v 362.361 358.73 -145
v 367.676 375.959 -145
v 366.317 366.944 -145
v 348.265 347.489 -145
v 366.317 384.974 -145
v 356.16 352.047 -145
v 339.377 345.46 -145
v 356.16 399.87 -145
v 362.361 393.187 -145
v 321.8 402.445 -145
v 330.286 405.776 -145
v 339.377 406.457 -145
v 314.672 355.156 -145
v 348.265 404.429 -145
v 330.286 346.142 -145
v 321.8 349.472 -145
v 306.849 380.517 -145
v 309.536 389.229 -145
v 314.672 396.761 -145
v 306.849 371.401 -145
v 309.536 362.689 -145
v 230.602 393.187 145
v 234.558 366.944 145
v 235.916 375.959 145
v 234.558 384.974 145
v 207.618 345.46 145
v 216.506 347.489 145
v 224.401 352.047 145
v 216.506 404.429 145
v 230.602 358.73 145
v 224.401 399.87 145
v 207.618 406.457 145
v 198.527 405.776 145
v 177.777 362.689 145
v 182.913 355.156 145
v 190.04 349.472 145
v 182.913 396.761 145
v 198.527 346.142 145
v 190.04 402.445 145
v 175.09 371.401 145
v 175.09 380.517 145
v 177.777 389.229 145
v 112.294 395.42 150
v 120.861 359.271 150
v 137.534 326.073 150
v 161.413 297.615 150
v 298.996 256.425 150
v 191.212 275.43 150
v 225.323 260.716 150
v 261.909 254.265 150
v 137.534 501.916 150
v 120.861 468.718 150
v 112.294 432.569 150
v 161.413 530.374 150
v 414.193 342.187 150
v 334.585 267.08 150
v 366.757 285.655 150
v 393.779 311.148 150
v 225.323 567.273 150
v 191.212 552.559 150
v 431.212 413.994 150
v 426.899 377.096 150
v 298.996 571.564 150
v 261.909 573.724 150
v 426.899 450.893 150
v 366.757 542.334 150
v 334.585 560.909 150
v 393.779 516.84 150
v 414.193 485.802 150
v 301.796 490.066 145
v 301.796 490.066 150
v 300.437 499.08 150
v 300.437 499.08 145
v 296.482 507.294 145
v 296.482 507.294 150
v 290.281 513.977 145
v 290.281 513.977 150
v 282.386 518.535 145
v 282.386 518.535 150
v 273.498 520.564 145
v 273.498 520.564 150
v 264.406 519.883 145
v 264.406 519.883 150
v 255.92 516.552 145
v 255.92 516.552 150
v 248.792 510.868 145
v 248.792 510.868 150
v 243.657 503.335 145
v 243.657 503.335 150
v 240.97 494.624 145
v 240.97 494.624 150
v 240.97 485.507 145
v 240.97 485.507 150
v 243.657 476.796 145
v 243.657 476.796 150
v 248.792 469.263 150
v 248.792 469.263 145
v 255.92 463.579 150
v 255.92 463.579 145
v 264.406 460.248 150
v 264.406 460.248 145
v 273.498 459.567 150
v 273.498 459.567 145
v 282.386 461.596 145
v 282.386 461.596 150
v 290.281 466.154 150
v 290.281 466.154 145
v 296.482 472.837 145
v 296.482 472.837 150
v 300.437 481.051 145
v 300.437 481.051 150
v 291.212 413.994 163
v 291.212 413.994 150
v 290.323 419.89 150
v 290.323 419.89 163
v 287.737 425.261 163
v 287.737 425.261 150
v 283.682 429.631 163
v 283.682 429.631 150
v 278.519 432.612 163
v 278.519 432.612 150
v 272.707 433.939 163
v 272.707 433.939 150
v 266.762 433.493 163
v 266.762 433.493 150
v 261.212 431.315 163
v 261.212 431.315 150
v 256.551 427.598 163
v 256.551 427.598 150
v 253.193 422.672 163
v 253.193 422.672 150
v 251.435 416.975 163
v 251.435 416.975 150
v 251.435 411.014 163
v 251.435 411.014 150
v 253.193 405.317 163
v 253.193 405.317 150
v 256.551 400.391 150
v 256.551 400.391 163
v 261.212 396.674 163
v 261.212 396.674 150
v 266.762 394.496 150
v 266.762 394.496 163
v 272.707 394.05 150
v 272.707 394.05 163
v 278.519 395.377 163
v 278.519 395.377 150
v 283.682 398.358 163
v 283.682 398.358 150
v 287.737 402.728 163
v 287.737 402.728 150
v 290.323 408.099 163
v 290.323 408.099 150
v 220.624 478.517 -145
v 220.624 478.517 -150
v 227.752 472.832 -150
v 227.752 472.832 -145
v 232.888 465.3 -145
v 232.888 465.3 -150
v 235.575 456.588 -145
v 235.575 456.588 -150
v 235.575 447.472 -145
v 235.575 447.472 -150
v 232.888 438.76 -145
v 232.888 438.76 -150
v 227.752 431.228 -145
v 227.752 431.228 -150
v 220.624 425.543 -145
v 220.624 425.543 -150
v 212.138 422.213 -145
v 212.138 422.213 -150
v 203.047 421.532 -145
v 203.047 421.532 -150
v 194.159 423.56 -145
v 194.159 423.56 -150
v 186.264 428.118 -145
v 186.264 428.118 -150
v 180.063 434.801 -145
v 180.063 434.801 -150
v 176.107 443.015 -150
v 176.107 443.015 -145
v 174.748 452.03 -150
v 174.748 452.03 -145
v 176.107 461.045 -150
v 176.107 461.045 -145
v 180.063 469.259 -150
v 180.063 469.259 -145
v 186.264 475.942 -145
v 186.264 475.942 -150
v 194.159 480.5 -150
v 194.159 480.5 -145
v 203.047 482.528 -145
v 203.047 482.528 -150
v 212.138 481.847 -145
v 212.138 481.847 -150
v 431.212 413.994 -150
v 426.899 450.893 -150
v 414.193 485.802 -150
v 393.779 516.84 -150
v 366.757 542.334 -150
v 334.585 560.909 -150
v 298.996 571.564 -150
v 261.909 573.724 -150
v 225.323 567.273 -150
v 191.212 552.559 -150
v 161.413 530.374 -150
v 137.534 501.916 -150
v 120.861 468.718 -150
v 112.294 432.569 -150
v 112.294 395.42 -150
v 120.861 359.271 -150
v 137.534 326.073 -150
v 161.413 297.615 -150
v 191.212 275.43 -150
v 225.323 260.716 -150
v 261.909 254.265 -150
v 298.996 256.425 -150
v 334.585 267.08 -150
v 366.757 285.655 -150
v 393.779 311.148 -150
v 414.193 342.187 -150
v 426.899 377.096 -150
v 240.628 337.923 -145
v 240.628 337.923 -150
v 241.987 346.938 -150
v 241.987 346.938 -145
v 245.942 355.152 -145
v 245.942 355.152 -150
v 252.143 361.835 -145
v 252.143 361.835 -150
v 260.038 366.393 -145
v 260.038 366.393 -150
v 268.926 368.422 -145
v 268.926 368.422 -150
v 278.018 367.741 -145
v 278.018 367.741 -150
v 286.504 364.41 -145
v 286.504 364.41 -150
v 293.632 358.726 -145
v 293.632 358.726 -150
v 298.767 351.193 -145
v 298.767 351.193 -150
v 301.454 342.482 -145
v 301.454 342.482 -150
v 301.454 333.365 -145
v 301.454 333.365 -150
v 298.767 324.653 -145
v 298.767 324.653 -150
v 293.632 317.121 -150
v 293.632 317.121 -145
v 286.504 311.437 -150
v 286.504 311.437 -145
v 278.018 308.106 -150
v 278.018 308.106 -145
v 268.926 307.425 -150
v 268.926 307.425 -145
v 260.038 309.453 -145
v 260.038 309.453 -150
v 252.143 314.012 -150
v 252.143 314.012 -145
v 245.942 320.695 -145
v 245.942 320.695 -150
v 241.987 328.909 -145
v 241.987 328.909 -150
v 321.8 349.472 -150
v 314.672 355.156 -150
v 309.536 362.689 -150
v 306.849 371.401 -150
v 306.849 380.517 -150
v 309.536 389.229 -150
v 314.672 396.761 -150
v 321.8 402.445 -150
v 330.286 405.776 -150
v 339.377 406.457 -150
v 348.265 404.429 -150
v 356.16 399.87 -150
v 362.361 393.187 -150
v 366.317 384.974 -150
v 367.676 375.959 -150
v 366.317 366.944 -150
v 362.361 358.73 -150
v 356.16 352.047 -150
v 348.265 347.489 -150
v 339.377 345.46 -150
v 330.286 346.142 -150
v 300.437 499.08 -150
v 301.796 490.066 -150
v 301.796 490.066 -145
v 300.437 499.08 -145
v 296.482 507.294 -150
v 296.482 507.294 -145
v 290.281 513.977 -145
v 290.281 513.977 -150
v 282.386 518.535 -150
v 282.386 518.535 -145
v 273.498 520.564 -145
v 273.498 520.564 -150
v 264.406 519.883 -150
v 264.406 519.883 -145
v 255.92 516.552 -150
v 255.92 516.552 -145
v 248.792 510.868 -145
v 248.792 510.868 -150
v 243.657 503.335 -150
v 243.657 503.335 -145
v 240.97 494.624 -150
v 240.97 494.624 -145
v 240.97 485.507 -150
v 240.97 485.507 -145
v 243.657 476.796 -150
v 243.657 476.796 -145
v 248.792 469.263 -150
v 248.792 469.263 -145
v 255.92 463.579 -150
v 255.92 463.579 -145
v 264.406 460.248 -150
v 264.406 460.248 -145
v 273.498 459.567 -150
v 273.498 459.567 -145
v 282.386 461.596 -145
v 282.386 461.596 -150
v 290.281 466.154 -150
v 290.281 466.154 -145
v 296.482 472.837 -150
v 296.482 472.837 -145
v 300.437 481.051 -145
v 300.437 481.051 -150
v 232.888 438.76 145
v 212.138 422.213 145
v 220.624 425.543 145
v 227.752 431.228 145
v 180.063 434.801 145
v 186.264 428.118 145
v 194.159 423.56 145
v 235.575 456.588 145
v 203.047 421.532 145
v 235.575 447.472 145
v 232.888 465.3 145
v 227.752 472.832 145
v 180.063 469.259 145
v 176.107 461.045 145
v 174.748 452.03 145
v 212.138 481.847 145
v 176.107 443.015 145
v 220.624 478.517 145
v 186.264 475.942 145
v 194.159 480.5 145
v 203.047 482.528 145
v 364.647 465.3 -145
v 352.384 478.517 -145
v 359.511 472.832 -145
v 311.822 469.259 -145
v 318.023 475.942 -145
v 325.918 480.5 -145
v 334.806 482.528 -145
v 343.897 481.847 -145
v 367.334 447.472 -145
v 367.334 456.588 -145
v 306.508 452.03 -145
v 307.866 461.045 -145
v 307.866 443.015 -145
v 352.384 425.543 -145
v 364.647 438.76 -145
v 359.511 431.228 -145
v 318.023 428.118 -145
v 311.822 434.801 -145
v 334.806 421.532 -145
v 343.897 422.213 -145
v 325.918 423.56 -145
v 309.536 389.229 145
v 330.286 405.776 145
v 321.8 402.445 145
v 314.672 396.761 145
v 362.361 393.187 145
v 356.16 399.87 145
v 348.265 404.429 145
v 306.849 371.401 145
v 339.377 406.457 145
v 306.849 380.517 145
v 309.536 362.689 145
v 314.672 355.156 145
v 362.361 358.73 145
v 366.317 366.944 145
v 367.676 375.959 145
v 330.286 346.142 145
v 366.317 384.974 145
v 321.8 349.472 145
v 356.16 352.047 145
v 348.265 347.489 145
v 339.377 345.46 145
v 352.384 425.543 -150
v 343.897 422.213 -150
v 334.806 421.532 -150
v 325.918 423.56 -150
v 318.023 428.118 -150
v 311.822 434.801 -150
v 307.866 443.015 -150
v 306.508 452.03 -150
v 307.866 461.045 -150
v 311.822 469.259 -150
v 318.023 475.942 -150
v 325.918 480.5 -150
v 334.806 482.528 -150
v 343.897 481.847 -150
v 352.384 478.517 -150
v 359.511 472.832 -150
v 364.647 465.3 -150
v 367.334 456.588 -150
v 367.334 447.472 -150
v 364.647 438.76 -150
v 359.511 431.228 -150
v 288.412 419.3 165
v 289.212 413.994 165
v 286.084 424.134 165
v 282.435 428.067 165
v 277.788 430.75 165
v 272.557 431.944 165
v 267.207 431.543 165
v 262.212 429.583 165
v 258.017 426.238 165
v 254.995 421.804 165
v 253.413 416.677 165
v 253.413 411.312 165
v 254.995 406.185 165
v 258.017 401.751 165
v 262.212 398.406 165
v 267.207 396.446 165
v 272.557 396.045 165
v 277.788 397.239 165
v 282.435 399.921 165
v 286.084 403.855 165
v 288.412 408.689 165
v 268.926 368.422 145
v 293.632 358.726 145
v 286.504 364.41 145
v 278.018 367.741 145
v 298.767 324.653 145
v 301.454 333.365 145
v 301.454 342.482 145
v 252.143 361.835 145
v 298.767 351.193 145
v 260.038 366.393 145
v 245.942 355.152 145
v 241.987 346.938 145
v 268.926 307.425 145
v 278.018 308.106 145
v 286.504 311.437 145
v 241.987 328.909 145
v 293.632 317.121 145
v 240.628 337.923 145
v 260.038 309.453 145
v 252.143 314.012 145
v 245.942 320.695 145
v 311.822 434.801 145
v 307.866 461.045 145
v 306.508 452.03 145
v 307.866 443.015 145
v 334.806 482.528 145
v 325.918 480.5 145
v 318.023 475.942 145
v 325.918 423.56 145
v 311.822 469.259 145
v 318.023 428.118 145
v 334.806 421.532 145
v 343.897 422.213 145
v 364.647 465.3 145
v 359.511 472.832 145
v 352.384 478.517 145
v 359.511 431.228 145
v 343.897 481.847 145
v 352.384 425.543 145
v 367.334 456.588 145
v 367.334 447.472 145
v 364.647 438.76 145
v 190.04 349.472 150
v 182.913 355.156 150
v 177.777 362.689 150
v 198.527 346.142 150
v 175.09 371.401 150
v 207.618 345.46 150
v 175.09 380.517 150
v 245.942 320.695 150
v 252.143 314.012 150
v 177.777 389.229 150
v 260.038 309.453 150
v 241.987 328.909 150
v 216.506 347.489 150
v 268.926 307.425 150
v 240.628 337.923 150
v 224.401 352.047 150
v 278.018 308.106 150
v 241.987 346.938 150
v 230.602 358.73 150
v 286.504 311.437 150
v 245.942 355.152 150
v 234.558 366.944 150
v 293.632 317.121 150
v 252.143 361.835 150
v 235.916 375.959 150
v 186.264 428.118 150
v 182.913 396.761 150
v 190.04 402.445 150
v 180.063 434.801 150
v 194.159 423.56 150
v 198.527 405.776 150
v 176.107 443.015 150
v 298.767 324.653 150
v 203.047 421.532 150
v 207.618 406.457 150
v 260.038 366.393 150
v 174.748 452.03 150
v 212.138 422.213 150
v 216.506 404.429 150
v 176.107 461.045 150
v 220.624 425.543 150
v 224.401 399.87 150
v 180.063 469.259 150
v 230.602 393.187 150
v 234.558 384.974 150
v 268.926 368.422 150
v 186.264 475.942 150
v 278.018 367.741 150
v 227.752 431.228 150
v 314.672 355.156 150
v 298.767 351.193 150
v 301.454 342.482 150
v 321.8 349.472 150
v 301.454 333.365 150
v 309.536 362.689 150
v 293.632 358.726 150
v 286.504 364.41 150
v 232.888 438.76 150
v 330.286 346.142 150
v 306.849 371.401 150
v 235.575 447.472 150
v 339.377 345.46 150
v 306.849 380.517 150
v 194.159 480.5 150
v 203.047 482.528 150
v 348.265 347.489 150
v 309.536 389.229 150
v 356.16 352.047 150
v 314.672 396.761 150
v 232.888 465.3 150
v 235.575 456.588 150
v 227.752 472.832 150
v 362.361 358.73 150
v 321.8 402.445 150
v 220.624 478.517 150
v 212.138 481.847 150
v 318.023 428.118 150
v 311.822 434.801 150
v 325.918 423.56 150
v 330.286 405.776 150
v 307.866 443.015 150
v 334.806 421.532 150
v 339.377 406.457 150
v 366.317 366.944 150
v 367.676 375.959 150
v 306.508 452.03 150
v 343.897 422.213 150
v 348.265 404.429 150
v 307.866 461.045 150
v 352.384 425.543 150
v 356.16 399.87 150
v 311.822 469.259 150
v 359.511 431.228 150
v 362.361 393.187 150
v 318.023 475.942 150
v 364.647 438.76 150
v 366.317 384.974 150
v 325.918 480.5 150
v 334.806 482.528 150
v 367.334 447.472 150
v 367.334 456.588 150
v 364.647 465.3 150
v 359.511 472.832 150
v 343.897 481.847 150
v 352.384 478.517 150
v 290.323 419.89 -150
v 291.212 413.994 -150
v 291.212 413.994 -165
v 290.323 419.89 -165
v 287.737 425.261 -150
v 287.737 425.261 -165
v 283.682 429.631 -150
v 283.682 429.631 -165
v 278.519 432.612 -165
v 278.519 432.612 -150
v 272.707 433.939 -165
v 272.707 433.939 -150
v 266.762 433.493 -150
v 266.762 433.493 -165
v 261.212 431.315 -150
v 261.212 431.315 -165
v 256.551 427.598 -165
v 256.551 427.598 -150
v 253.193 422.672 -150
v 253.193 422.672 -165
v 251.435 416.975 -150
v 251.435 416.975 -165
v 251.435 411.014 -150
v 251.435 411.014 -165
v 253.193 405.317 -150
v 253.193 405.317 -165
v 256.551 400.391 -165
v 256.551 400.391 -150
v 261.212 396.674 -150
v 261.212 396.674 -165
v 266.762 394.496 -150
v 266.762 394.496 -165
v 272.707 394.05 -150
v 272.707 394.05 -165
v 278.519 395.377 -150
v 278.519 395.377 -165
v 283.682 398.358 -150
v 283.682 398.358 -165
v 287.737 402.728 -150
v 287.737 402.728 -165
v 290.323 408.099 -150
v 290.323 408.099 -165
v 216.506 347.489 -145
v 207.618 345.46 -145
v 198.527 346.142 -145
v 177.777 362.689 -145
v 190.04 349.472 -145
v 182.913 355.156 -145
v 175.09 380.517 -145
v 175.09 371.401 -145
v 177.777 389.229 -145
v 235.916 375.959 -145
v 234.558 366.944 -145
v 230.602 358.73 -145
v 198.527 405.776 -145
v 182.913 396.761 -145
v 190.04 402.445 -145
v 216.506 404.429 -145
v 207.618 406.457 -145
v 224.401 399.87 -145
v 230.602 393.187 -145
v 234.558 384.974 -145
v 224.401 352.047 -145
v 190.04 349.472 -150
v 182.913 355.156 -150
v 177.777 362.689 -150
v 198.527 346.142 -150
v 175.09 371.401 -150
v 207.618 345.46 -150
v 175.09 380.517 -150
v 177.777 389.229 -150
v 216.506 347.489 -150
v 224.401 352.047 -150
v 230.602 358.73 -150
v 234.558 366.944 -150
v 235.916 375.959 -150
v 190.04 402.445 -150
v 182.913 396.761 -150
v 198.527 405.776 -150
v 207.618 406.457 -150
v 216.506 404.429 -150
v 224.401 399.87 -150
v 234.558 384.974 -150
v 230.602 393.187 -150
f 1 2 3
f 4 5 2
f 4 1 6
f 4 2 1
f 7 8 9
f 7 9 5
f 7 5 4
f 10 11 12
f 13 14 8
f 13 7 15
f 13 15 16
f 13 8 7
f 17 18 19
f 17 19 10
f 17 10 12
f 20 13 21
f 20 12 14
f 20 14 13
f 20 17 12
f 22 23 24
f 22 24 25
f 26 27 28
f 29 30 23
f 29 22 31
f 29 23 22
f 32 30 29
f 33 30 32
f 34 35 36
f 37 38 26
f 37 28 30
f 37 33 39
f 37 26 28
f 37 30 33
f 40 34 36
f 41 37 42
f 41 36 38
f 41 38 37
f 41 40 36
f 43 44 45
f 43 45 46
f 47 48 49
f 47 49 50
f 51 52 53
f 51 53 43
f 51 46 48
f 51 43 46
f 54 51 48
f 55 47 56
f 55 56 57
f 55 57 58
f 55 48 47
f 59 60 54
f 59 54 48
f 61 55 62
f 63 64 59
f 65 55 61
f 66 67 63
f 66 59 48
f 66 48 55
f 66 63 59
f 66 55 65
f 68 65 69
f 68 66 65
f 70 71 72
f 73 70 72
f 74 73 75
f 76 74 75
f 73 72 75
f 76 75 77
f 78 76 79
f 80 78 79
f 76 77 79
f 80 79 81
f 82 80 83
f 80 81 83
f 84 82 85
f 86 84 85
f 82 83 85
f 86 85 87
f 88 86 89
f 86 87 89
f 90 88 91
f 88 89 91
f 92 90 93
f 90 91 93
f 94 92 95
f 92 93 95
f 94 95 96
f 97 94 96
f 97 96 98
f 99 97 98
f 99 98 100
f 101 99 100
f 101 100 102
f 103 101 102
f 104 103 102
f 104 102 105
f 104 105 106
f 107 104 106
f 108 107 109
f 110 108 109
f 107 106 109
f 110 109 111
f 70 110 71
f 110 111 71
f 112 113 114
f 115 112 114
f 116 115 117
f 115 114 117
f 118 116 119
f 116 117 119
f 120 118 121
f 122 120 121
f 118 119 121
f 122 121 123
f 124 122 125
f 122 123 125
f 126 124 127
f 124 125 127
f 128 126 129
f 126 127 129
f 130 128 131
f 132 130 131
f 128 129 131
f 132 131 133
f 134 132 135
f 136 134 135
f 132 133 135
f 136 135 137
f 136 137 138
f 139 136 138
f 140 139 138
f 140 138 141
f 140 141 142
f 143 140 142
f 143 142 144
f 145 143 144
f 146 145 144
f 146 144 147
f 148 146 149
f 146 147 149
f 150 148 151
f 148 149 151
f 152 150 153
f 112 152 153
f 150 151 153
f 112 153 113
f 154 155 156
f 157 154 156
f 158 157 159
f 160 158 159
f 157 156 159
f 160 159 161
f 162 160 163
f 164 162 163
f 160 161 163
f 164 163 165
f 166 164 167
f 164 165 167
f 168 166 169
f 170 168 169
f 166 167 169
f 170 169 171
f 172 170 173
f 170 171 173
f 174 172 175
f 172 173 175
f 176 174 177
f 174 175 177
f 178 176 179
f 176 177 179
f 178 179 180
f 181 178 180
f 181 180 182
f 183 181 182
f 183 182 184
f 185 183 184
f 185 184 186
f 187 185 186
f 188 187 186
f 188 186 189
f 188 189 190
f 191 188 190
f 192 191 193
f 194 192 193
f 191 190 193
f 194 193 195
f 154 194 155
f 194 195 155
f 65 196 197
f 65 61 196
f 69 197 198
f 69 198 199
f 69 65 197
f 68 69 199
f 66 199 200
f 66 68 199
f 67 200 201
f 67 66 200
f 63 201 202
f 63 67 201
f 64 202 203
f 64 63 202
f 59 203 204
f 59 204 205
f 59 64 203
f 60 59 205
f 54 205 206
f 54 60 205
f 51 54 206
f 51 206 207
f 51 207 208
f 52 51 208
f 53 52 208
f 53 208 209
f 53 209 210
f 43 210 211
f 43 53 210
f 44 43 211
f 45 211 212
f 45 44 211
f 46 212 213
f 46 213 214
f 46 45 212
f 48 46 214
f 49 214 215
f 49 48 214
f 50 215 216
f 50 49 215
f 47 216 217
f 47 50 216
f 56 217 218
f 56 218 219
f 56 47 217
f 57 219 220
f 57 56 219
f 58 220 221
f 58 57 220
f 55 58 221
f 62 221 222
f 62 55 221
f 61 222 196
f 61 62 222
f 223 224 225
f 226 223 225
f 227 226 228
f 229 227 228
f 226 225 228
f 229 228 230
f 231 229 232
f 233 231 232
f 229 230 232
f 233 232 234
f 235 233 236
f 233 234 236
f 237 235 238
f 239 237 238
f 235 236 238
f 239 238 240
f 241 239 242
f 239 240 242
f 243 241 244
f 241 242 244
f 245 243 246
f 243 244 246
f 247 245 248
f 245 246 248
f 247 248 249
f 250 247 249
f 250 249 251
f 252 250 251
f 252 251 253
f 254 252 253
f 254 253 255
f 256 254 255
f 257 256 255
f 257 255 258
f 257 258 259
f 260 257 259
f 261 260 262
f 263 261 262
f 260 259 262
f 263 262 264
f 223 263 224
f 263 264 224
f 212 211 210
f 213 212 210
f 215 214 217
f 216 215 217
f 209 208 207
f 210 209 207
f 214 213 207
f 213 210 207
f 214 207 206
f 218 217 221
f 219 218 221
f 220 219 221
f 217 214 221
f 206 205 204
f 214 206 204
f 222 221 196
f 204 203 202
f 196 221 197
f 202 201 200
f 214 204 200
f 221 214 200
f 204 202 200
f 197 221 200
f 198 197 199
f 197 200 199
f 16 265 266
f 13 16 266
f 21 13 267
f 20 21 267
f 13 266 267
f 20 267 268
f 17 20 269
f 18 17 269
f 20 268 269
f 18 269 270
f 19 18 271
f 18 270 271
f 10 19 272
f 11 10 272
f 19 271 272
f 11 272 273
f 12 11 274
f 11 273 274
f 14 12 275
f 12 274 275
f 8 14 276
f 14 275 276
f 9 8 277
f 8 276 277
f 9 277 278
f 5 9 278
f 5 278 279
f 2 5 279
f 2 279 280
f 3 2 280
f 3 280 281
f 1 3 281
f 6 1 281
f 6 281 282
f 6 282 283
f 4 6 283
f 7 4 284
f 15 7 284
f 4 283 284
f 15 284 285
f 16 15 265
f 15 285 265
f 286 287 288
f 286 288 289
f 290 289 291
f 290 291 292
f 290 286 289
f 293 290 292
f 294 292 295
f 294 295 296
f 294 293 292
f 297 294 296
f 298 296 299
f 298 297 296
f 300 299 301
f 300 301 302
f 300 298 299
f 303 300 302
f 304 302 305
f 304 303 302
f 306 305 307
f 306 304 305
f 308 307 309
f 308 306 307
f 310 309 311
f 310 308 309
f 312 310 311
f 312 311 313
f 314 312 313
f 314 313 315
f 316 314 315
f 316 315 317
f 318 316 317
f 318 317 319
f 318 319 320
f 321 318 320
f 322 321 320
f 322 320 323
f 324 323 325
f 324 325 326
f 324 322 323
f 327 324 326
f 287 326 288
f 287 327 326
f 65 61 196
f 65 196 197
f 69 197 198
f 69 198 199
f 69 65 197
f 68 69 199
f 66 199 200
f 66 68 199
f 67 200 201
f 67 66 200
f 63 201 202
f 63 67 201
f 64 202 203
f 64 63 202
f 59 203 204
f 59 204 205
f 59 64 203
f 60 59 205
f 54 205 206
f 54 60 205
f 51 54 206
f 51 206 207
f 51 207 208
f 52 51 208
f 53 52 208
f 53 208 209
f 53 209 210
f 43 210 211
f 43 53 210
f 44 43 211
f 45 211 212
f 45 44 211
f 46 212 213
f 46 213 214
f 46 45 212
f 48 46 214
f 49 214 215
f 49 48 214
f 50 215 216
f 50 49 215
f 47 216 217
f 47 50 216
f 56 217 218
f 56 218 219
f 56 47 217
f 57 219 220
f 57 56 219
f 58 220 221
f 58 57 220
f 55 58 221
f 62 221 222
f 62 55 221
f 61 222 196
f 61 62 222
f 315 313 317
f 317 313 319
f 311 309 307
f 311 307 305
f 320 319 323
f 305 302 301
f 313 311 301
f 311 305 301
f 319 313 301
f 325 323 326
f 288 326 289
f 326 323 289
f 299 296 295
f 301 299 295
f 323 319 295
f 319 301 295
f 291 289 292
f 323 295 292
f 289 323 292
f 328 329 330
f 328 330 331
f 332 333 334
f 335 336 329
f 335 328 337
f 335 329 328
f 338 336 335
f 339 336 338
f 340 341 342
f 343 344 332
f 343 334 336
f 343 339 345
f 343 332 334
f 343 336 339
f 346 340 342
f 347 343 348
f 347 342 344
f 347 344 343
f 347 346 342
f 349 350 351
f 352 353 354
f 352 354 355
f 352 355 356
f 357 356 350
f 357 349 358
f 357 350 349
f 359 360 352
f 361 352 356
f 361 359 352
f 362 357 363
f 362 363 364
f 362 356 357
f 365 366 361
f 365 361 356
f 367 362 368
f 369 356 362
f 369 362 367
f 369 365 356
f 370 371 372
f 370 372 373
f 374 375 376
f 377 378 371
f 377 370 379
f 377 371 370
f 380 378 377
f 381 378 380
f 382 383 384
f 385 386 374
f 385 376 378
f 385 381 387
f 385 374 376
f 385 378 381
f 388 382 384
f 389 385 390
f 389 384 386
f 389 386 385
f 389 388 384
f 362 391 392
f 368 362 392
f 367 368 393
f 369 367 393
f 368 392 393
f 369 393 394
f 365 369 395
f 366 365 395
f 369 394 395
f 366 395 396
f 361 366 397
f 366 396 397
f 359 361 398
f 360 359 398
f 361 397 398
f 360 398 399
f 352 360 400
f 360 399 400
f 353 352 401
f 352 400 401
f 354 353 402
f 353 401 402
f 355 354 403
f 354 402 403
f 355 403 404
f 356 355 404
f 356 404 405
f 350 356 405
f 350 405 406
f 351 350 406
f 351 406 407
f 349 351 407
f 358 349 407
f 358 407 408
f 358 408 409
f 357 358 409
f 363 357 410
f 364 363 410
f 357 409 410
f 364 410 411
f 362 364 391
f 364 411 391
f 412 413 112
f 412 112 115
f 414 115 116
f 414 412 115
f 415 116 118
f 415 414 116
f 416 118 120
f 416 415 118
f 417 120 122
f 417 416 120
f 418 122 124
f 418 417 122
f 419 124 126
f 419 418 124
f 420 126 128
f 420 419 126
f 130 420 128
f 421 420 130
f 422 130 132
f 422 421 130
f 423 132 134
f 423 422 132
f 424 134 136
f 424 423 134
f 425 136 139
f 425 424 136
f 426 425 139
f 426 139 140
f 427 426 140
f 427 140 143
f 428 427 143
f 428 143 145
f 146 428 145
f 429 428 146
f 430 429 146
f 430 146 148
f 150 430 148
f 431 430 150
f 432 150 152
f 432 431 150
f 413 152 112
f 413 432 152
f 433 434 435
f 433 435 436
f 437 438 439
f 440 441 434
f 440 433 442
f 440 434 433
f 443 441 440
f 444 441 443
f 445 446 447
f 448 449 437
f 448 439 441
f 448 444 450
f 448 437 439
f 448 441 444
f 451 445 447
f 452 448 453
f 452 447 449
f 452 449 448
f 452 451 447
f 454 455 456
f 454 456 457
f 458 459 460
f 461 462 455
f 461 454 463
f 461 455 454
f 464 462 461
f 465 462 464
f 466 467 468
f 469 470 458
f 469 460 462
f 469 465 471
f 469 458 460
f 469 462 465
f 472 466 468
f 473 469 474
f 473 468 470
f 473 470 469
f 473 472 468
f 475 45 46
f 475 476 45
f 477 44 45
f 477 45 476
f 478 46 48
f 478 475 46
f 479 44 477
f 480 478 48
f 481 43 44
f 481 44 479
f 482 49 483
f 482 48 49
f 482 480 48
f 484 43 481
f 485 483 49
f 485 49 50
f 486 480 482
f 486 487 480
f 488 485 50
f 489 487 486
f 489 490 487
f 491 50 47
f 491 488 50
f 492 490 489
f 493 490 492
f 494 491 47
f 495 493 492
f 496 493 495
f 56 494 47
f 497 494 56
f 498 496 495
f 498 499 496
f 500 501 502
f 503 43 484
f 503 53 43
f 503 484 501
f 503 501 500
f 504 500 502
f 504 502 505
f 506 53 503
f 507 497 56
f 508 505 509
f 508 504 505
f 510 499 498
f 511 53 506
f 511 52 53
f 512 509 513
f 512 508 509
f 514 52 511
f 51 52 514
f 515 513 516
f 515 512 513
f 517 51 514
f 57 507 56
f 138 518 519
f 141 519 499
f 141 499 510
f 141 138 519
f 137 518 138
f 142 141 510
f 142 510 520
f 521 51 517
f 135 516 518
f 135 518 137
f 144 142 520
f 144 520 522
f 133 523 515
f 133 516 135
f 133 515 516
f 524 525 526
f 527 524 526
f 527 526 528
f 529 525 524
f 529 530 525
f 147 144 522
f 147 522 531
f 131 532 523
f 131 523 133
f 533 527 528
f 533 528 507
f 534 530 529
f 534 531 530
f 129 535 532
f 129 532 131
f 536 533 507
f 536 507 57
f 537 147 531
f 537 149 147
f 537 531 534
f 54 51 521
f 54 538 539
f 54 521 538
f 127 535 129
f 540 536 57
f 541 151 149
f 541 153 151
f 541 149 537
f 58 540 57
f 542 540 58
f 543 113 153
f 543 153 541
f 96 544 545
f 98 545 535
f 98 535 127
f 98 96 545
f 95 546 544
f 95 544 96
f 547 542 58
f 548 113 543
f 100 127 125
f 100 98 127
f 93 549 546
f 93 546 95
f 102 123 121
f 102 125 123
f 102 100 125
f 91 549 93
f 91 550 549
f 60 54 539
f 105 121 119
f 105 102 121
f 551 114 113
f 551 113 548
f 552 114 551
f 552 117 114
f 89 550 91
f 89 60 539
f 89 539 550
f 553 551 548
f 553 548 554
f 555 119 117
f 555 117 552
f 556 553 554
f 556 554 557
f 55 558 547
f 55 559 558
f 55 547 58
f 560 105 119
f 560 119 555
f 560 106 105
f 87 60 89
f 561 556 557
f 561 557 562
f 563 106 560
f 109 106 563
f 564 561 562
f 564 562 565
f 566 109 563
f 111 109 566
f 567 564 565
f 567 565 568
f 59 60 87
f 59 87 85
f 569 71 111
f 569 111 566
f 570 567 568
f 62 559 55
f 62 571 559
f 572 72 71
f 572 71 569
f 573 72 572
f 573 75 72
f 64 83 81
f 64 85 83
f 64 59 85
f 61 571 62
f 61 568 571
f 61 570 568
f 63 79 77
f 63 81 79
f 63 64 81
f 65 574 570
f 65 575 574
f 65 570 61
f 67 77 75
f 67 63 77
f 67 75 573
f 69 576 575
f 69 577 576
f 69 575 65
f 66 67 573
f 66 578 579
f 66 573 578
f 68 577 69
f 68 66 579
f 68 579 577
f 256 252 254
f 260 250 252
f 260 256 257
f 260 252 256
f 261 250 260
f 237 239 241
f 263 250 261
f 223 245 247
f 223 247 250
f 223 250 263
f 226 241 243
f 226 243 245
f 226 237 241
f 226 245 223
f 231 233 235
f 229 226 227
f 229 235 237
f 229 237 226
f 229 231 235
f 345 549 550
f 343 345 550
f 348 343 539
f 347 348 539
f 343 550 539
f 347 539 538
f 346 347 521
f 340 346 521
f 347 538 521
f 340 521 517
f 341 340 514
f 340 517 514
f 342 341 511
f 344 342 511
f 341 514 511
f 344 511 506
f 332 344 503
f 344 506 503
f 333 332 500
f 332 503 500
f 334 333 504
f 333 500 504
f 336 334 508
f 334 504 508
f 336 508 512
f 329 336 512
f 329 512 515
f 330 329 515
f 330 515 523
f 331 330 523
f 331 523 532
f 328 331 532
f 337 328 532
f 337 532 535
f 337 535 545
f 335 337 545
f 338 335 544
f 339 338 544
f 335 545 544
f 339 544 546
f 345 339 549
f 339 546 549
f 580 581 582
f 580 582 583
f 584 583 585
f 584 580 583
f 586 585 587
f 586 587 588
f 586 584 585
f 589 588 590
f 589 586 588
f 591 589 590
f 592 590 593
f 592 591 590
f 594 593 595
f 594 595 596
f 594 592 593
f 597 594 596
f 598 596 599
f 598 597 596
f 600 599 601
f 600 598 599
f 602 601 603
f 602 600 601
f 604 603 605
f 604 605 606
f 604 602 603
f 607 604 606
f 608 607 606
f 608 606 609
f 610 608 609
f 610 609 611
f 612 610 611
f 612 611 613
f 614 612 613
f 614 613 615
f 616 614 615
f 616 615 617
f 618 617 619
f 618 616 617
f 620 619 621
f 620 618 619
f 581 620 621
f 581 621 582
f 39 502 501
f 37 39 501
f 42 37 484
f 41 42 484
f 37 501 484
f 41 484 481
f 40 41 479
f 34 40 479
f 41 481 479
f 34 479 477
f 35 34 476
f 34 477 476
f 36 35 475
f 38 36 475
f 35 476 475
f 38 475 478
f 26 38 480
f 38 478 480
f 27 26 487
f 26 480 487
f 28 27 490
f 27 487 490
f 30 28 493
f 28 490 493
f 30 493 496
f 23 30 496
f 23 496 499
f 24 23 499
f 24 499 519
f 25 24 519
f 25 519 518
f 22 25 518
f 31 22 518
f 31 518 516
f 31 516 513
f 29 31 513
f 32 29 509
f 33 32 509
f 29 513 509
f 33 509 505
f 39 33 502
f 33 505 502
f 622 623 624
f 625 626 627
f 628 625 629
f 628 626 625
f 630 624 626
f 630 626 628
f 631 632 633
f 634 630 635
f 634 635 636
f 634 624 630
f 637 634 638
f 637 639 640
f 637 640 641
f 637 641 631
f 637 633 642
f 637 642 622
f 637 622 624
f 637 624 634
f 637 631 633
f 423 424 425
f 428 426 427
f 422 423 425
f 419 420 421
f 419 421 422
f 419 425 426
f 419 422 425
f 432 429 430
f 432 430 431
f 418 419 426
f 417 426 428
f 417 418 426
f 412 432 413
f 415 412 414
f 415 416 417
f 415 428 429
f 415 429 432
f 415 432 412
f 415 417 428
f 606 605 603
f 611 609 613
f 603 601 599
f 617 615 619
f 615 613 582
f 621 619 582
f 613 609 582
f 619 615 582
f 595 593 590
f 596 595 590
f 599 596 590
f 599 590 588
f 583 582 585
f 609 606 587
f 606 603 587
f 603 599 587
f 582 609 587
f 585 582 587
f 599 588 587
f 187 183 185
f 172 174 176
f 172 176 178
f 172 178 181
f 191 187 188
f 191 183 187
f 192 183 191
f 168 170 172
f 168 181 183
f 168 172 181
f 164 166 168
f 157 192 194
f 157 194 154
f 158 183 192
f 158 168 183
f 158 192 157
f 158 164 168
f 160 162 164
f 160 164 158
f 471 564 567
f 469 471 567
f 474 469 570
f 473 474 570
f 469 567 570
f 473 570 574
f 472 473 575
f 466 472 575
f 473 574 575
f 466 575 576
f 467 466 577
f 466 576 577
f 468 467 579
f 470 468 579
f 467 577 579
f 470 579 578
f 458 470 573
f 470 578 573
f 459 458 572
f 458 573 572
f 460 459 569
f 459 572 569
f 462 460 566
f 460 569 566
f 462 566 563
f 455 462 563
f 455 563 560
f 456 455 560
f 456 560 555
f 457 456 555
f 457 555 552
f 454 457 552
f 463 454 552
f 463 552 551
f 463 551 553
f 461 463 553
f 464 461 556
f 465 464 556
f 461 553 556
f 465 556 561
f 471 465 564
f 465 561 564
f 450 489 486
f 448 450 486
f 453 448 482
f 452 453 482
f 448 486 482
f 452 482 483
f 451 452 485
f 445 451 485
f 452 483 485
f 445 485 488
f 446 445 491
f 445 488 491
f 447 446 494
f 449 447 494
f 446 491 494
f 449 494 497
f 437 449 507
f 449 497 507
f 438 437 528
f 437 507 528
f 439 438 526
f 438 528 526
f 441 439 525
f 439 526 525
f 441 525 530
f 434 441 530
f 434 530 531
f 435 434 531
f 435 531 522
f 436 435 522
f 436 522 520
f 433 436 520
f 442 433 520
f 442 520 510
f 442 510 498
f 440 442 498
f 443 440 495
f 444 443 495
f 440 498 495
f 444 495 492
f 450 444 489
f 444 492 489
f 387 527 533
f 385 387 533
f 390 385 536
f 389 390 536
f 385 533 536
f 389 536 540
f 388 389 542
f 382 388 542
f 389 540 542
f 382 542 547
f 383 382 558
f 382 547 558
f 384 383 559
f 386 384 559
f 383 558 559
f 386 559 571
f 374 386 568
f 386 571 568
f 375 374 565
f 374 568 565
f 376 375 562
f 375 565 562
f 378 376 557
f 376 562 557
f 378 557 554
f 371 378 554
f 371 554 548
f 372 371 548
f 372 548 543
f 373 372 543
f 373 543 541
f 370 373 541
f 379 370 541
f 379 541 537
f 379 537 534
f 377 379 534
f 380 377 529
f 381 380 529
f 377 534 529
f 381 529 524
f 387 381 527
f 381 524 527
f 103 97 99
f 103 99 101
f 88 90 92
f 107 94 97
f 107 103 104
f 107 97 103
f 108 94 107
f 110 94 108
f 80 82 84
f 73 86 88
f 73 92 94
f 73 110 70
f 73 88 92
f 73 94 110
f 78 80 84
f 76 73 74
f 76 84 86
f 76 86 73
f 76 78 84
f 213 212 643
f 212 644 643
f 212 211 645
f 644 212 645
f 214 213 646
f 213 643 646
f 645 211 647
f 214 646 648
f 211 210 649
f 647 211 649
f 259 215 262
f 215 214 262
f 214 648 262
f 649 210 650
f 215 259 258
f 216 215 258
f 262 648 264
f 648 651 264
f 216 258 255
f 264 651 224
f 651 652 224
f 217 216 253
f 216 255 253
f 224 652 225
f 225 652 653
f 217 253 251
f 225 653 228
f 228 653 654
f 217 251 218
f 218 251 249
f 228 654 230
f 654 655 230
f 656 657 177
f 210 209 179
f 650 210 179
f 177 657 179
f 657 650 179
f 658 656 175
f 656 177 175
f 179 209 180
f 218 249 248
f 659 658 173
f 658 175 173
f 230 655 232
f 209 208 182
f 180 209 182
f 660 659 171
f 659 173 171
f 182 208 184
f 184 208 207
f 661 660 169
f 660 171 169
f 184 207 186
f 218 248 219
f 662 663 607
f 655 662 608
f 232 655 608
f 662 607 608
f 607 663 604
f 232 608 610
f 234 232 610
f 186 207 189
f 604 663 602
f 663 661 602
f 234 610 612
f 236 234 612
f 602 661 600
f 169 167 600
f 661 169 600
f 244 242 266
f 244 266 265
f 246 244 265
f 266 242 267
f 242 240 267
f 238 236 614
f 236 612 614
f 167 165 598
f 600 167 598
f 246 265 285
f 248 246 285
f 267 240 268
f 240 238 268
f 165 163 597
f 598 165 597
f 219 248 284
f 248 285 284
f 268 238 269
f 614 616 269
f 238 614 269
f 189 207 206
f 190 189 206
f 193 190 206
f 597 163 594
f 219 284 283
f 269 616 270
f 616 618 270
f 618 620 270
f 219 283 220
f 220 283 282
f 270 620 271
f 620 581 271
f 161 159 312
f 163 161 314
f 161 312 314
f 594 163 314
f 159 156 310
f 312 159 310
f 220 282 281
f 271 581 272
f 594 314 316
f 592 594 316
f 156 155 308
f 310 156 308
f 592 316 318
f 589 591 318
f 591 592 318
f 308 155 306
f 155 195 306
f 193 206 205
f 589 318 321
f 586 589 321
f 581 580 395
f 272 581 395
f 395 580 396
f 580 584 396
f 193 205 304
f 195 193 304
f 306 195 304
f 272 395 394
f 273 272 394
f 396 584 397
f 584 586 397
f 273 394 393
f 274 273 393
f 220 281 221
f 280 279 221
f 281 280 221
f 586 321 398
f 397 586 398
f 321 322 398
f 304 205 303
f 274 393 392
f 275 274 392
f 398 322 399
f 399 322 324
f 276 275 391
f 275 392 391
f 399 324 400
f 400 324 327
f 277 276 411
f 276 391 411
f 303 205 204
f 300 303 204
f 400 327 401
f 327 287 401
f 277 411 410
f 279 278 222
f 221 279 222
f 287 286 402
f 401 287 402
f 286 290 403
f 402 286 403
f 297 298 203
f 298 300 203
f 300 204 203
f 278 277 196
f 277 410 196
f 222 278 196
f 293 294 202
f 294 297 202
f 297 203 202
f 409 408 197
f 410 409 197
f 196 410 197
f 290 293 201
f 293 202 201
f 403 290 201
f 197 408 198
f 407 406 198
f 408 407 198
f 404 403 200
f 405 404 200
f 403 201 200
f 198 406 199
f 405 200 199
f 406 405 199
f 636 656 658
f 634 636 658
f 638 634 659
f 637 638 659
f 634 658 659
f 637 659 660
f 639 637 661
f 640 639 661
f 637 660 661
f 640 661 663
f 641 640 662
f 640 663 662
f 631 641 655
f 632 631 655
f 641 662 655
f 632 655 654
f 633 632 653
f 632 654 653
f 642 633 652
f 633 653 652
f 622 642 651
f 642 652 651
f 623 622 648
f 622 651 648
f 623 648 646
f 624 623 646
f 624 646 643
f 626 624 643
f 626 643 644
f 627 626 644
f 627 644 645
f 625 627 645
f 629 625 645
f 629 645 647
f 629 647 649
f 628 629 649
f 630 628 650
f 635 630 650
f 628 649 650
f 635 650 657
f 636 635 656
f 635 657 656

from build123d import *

# Parameters (mm, degrees)
SKETCH1_R               = 160
BOSS_EXTRUDE1_DEPTH     = 150
SKETCH2_R               = 30.583998029
CUT_EXTRUDE1_DEPTH      = 5
CIRPATTERN1_COUNT       = 6
MIRROR1_COPY_1_SKETCH_R = 30.583998029
MIRROR1_COPY_1_DEPTH    = 5
MIRROR1_COPY_2_SKETCH_R = 30.583998029
MIRROR1_COPY_2_DEPTH    = 5
MIRROR1_COPY_3_SKETCH_R = 30.583998029
MIRROR1_COPY_3_DEPTH    = 5
MIRROR1_COPY_4_SKETCH_R = 30.583998029
MIRROR1_COPY_4_DEPTH    = 5
MIRROR1_COPY_5_SKETCH_R = 30.583998029
MIRROR1_COPY_5_DEPTH    = 5
SKETCH3_R               = 20
BOSS_EXTRUDE2_DEPTH     = 15
CHAMFER1_SIZE           = 2
SKETCH4_R               = 160
BOSS_EXTRUDE3_DEPTH     = 300


with BuildPart() as part:
    # Sketch1 → Boss-Extrude1 (new, symmetric)
    with BuildSketch(Plane.XY):
        with Locations((271.211975439, 413.994449049)):
            Circle(SKETCH1_R)
    extrude(amount=BOSS_EXTRUDE1_DEPTH, both=True)

    # Sketch2 → Cut-Extrude1 (cut)
    with BuildSketch(Plane.XY.offset(150)):
        with Locations((271.211975439, 490.065575896)):
            Circle(SKETCH2_R)
    cut_extrude1 = extrude(amount=-CUT_EXTRUDE1_DEPTH, mode=Mode.SUBTRACT)

    # CirPattern1: Cut-Extrude1 ×6 about axis
    cirpattern1_axis = Axis((271.211975439, 413.994449049, 0), (0, 0, 1))
    for i in range(1, CIRPATTERN1_COUNT):
        add(cut_extrude1.rotate(cirpattern1_axis, i * 360 / CIRPATTERN1_COUNT), mode=Mode.SUBTRACT)

    # Mirror1: Cut-Extrude1 across plane
    add(cut_extrude1.mirror(Plane.XY), mode=Mode.SUBTRACT)

    # Mirror1 copy 1 sketch → Mirror1 copy 1 (cut)
    with BuildSketch(Plane(origin=(494.135697622, -27.879236016, -150), x_dir=(0.5000000000000001, 0.8660254037844386, 0), z_dir=(0, 0, -1))):
        with Locations((271.211975439, -490.065575896)):
            Circle(MIRROR1_COPY_1_SKETCH_R)
    extrude(amount=-MIRROR1_COPY_1_DEPTH, mode=Mode.SUBTRACT)

    # Mirror1 copy 2 sketch → Mirror1 copy 2 (cut)
    with BuildSketch(Plane(origin=(765.347673061, 386.115213033, -150), x_dir=(-0.4999999999999998, 0.8660254037844387, 0), z_dir=(0, 0, -1))):
        with Locations((271.211975439, -490.065575896)):
            Circle(MIRROR1_COPY_2_SKETCH_R)
    extrude(amount=-MIRROR1_COPY_2_DEPTH, mode=Mode.SUBTRACT)

    # Mirror1 copy 3 sketch → Mirror1 copy 3 (cut)
    with BuildSketch(Plane(origin=(542.423950878, 827.988898099, -150), x_dir=(-1, 0, 0), z_dir=(0, 0, -1))):
        with Locations((271.211975439, -490.065575896)):
            Circle(MIRROR1_COPY_3_SKETCH_R)
    extrude(amount=-MIRROR1_COPY_3_DEPTH, mode=Mode.SUBTRACT)

    # Mirror1 copy 4 sketch → Mirror1 copy 4 (cut)
    with BuildSketch(Plane(origin=(48.288253256, 855.868134114, -150), x_dir=(-0.5000000000000004, -0.8660254037844384, 0), z_dir=(0, 0, -1))):
        with Locations((271.211975439, -490.065575896)):
            Circle(MIRROR1_COPY_4_SKETCH_R)
    extrude(amount=-MIRROR1_COPY_4_DEPTH, mode=Mode.SUBTRACT)

    # Mirror1 copy 5 sketch → Mirror1 copy 5 (cut)
    with BuildSketch(Plane(origin=(-222.923722183, 441.873685065, -150), x_dir=(0.5000000000000001, -0.8660254037844386, 0), z_dir=(0, 0, -1))):
        with Locations((271.211975439, -490.065575896)):
            Circle(MIRROR1_COPY_5_SKETCH_R)
    extrude(amount=-MIRROR1_COPY_5_DEPTH, mode=Mode.SUBTRACT)

    # Sketch3 → Boss-Extrude2 (add)
    with BuildSketch(Plane.XY.offset(150)):
        with Locations((271.211975439, 413.994449049)):
            Circle(SKETCH3_R)
    boss_extrude2 = extrude(amount=BOSS_EXTRUDE2_DEPTH)

    # Chamfer1
    chamfer1_edges = [part.edges().sort_by_distance(p)[0] for p in [
        (251.211975439, 413.994449049, 165),
    ]]
    chamfer(chamfer1_edges, length=CHAMFER1_SIZE)

    # Mirror4: Boss-Extrude2 across plane
    add(boss_extrude2.mirror(Plane.XY))


with BuildPart() as body_2:
    # Sketch4 → Boss-Extrude3 (new body)
    with BuildSketch(Plane.XY.offset(150)):
        with Locations((271.211975439, 413.994449049)):
            Circle(SKETCH4_R)
    extrude(amount=-BOSS_EXTRUDE3_DEPTH)


solid = Compound([part.part, body_2.part])
